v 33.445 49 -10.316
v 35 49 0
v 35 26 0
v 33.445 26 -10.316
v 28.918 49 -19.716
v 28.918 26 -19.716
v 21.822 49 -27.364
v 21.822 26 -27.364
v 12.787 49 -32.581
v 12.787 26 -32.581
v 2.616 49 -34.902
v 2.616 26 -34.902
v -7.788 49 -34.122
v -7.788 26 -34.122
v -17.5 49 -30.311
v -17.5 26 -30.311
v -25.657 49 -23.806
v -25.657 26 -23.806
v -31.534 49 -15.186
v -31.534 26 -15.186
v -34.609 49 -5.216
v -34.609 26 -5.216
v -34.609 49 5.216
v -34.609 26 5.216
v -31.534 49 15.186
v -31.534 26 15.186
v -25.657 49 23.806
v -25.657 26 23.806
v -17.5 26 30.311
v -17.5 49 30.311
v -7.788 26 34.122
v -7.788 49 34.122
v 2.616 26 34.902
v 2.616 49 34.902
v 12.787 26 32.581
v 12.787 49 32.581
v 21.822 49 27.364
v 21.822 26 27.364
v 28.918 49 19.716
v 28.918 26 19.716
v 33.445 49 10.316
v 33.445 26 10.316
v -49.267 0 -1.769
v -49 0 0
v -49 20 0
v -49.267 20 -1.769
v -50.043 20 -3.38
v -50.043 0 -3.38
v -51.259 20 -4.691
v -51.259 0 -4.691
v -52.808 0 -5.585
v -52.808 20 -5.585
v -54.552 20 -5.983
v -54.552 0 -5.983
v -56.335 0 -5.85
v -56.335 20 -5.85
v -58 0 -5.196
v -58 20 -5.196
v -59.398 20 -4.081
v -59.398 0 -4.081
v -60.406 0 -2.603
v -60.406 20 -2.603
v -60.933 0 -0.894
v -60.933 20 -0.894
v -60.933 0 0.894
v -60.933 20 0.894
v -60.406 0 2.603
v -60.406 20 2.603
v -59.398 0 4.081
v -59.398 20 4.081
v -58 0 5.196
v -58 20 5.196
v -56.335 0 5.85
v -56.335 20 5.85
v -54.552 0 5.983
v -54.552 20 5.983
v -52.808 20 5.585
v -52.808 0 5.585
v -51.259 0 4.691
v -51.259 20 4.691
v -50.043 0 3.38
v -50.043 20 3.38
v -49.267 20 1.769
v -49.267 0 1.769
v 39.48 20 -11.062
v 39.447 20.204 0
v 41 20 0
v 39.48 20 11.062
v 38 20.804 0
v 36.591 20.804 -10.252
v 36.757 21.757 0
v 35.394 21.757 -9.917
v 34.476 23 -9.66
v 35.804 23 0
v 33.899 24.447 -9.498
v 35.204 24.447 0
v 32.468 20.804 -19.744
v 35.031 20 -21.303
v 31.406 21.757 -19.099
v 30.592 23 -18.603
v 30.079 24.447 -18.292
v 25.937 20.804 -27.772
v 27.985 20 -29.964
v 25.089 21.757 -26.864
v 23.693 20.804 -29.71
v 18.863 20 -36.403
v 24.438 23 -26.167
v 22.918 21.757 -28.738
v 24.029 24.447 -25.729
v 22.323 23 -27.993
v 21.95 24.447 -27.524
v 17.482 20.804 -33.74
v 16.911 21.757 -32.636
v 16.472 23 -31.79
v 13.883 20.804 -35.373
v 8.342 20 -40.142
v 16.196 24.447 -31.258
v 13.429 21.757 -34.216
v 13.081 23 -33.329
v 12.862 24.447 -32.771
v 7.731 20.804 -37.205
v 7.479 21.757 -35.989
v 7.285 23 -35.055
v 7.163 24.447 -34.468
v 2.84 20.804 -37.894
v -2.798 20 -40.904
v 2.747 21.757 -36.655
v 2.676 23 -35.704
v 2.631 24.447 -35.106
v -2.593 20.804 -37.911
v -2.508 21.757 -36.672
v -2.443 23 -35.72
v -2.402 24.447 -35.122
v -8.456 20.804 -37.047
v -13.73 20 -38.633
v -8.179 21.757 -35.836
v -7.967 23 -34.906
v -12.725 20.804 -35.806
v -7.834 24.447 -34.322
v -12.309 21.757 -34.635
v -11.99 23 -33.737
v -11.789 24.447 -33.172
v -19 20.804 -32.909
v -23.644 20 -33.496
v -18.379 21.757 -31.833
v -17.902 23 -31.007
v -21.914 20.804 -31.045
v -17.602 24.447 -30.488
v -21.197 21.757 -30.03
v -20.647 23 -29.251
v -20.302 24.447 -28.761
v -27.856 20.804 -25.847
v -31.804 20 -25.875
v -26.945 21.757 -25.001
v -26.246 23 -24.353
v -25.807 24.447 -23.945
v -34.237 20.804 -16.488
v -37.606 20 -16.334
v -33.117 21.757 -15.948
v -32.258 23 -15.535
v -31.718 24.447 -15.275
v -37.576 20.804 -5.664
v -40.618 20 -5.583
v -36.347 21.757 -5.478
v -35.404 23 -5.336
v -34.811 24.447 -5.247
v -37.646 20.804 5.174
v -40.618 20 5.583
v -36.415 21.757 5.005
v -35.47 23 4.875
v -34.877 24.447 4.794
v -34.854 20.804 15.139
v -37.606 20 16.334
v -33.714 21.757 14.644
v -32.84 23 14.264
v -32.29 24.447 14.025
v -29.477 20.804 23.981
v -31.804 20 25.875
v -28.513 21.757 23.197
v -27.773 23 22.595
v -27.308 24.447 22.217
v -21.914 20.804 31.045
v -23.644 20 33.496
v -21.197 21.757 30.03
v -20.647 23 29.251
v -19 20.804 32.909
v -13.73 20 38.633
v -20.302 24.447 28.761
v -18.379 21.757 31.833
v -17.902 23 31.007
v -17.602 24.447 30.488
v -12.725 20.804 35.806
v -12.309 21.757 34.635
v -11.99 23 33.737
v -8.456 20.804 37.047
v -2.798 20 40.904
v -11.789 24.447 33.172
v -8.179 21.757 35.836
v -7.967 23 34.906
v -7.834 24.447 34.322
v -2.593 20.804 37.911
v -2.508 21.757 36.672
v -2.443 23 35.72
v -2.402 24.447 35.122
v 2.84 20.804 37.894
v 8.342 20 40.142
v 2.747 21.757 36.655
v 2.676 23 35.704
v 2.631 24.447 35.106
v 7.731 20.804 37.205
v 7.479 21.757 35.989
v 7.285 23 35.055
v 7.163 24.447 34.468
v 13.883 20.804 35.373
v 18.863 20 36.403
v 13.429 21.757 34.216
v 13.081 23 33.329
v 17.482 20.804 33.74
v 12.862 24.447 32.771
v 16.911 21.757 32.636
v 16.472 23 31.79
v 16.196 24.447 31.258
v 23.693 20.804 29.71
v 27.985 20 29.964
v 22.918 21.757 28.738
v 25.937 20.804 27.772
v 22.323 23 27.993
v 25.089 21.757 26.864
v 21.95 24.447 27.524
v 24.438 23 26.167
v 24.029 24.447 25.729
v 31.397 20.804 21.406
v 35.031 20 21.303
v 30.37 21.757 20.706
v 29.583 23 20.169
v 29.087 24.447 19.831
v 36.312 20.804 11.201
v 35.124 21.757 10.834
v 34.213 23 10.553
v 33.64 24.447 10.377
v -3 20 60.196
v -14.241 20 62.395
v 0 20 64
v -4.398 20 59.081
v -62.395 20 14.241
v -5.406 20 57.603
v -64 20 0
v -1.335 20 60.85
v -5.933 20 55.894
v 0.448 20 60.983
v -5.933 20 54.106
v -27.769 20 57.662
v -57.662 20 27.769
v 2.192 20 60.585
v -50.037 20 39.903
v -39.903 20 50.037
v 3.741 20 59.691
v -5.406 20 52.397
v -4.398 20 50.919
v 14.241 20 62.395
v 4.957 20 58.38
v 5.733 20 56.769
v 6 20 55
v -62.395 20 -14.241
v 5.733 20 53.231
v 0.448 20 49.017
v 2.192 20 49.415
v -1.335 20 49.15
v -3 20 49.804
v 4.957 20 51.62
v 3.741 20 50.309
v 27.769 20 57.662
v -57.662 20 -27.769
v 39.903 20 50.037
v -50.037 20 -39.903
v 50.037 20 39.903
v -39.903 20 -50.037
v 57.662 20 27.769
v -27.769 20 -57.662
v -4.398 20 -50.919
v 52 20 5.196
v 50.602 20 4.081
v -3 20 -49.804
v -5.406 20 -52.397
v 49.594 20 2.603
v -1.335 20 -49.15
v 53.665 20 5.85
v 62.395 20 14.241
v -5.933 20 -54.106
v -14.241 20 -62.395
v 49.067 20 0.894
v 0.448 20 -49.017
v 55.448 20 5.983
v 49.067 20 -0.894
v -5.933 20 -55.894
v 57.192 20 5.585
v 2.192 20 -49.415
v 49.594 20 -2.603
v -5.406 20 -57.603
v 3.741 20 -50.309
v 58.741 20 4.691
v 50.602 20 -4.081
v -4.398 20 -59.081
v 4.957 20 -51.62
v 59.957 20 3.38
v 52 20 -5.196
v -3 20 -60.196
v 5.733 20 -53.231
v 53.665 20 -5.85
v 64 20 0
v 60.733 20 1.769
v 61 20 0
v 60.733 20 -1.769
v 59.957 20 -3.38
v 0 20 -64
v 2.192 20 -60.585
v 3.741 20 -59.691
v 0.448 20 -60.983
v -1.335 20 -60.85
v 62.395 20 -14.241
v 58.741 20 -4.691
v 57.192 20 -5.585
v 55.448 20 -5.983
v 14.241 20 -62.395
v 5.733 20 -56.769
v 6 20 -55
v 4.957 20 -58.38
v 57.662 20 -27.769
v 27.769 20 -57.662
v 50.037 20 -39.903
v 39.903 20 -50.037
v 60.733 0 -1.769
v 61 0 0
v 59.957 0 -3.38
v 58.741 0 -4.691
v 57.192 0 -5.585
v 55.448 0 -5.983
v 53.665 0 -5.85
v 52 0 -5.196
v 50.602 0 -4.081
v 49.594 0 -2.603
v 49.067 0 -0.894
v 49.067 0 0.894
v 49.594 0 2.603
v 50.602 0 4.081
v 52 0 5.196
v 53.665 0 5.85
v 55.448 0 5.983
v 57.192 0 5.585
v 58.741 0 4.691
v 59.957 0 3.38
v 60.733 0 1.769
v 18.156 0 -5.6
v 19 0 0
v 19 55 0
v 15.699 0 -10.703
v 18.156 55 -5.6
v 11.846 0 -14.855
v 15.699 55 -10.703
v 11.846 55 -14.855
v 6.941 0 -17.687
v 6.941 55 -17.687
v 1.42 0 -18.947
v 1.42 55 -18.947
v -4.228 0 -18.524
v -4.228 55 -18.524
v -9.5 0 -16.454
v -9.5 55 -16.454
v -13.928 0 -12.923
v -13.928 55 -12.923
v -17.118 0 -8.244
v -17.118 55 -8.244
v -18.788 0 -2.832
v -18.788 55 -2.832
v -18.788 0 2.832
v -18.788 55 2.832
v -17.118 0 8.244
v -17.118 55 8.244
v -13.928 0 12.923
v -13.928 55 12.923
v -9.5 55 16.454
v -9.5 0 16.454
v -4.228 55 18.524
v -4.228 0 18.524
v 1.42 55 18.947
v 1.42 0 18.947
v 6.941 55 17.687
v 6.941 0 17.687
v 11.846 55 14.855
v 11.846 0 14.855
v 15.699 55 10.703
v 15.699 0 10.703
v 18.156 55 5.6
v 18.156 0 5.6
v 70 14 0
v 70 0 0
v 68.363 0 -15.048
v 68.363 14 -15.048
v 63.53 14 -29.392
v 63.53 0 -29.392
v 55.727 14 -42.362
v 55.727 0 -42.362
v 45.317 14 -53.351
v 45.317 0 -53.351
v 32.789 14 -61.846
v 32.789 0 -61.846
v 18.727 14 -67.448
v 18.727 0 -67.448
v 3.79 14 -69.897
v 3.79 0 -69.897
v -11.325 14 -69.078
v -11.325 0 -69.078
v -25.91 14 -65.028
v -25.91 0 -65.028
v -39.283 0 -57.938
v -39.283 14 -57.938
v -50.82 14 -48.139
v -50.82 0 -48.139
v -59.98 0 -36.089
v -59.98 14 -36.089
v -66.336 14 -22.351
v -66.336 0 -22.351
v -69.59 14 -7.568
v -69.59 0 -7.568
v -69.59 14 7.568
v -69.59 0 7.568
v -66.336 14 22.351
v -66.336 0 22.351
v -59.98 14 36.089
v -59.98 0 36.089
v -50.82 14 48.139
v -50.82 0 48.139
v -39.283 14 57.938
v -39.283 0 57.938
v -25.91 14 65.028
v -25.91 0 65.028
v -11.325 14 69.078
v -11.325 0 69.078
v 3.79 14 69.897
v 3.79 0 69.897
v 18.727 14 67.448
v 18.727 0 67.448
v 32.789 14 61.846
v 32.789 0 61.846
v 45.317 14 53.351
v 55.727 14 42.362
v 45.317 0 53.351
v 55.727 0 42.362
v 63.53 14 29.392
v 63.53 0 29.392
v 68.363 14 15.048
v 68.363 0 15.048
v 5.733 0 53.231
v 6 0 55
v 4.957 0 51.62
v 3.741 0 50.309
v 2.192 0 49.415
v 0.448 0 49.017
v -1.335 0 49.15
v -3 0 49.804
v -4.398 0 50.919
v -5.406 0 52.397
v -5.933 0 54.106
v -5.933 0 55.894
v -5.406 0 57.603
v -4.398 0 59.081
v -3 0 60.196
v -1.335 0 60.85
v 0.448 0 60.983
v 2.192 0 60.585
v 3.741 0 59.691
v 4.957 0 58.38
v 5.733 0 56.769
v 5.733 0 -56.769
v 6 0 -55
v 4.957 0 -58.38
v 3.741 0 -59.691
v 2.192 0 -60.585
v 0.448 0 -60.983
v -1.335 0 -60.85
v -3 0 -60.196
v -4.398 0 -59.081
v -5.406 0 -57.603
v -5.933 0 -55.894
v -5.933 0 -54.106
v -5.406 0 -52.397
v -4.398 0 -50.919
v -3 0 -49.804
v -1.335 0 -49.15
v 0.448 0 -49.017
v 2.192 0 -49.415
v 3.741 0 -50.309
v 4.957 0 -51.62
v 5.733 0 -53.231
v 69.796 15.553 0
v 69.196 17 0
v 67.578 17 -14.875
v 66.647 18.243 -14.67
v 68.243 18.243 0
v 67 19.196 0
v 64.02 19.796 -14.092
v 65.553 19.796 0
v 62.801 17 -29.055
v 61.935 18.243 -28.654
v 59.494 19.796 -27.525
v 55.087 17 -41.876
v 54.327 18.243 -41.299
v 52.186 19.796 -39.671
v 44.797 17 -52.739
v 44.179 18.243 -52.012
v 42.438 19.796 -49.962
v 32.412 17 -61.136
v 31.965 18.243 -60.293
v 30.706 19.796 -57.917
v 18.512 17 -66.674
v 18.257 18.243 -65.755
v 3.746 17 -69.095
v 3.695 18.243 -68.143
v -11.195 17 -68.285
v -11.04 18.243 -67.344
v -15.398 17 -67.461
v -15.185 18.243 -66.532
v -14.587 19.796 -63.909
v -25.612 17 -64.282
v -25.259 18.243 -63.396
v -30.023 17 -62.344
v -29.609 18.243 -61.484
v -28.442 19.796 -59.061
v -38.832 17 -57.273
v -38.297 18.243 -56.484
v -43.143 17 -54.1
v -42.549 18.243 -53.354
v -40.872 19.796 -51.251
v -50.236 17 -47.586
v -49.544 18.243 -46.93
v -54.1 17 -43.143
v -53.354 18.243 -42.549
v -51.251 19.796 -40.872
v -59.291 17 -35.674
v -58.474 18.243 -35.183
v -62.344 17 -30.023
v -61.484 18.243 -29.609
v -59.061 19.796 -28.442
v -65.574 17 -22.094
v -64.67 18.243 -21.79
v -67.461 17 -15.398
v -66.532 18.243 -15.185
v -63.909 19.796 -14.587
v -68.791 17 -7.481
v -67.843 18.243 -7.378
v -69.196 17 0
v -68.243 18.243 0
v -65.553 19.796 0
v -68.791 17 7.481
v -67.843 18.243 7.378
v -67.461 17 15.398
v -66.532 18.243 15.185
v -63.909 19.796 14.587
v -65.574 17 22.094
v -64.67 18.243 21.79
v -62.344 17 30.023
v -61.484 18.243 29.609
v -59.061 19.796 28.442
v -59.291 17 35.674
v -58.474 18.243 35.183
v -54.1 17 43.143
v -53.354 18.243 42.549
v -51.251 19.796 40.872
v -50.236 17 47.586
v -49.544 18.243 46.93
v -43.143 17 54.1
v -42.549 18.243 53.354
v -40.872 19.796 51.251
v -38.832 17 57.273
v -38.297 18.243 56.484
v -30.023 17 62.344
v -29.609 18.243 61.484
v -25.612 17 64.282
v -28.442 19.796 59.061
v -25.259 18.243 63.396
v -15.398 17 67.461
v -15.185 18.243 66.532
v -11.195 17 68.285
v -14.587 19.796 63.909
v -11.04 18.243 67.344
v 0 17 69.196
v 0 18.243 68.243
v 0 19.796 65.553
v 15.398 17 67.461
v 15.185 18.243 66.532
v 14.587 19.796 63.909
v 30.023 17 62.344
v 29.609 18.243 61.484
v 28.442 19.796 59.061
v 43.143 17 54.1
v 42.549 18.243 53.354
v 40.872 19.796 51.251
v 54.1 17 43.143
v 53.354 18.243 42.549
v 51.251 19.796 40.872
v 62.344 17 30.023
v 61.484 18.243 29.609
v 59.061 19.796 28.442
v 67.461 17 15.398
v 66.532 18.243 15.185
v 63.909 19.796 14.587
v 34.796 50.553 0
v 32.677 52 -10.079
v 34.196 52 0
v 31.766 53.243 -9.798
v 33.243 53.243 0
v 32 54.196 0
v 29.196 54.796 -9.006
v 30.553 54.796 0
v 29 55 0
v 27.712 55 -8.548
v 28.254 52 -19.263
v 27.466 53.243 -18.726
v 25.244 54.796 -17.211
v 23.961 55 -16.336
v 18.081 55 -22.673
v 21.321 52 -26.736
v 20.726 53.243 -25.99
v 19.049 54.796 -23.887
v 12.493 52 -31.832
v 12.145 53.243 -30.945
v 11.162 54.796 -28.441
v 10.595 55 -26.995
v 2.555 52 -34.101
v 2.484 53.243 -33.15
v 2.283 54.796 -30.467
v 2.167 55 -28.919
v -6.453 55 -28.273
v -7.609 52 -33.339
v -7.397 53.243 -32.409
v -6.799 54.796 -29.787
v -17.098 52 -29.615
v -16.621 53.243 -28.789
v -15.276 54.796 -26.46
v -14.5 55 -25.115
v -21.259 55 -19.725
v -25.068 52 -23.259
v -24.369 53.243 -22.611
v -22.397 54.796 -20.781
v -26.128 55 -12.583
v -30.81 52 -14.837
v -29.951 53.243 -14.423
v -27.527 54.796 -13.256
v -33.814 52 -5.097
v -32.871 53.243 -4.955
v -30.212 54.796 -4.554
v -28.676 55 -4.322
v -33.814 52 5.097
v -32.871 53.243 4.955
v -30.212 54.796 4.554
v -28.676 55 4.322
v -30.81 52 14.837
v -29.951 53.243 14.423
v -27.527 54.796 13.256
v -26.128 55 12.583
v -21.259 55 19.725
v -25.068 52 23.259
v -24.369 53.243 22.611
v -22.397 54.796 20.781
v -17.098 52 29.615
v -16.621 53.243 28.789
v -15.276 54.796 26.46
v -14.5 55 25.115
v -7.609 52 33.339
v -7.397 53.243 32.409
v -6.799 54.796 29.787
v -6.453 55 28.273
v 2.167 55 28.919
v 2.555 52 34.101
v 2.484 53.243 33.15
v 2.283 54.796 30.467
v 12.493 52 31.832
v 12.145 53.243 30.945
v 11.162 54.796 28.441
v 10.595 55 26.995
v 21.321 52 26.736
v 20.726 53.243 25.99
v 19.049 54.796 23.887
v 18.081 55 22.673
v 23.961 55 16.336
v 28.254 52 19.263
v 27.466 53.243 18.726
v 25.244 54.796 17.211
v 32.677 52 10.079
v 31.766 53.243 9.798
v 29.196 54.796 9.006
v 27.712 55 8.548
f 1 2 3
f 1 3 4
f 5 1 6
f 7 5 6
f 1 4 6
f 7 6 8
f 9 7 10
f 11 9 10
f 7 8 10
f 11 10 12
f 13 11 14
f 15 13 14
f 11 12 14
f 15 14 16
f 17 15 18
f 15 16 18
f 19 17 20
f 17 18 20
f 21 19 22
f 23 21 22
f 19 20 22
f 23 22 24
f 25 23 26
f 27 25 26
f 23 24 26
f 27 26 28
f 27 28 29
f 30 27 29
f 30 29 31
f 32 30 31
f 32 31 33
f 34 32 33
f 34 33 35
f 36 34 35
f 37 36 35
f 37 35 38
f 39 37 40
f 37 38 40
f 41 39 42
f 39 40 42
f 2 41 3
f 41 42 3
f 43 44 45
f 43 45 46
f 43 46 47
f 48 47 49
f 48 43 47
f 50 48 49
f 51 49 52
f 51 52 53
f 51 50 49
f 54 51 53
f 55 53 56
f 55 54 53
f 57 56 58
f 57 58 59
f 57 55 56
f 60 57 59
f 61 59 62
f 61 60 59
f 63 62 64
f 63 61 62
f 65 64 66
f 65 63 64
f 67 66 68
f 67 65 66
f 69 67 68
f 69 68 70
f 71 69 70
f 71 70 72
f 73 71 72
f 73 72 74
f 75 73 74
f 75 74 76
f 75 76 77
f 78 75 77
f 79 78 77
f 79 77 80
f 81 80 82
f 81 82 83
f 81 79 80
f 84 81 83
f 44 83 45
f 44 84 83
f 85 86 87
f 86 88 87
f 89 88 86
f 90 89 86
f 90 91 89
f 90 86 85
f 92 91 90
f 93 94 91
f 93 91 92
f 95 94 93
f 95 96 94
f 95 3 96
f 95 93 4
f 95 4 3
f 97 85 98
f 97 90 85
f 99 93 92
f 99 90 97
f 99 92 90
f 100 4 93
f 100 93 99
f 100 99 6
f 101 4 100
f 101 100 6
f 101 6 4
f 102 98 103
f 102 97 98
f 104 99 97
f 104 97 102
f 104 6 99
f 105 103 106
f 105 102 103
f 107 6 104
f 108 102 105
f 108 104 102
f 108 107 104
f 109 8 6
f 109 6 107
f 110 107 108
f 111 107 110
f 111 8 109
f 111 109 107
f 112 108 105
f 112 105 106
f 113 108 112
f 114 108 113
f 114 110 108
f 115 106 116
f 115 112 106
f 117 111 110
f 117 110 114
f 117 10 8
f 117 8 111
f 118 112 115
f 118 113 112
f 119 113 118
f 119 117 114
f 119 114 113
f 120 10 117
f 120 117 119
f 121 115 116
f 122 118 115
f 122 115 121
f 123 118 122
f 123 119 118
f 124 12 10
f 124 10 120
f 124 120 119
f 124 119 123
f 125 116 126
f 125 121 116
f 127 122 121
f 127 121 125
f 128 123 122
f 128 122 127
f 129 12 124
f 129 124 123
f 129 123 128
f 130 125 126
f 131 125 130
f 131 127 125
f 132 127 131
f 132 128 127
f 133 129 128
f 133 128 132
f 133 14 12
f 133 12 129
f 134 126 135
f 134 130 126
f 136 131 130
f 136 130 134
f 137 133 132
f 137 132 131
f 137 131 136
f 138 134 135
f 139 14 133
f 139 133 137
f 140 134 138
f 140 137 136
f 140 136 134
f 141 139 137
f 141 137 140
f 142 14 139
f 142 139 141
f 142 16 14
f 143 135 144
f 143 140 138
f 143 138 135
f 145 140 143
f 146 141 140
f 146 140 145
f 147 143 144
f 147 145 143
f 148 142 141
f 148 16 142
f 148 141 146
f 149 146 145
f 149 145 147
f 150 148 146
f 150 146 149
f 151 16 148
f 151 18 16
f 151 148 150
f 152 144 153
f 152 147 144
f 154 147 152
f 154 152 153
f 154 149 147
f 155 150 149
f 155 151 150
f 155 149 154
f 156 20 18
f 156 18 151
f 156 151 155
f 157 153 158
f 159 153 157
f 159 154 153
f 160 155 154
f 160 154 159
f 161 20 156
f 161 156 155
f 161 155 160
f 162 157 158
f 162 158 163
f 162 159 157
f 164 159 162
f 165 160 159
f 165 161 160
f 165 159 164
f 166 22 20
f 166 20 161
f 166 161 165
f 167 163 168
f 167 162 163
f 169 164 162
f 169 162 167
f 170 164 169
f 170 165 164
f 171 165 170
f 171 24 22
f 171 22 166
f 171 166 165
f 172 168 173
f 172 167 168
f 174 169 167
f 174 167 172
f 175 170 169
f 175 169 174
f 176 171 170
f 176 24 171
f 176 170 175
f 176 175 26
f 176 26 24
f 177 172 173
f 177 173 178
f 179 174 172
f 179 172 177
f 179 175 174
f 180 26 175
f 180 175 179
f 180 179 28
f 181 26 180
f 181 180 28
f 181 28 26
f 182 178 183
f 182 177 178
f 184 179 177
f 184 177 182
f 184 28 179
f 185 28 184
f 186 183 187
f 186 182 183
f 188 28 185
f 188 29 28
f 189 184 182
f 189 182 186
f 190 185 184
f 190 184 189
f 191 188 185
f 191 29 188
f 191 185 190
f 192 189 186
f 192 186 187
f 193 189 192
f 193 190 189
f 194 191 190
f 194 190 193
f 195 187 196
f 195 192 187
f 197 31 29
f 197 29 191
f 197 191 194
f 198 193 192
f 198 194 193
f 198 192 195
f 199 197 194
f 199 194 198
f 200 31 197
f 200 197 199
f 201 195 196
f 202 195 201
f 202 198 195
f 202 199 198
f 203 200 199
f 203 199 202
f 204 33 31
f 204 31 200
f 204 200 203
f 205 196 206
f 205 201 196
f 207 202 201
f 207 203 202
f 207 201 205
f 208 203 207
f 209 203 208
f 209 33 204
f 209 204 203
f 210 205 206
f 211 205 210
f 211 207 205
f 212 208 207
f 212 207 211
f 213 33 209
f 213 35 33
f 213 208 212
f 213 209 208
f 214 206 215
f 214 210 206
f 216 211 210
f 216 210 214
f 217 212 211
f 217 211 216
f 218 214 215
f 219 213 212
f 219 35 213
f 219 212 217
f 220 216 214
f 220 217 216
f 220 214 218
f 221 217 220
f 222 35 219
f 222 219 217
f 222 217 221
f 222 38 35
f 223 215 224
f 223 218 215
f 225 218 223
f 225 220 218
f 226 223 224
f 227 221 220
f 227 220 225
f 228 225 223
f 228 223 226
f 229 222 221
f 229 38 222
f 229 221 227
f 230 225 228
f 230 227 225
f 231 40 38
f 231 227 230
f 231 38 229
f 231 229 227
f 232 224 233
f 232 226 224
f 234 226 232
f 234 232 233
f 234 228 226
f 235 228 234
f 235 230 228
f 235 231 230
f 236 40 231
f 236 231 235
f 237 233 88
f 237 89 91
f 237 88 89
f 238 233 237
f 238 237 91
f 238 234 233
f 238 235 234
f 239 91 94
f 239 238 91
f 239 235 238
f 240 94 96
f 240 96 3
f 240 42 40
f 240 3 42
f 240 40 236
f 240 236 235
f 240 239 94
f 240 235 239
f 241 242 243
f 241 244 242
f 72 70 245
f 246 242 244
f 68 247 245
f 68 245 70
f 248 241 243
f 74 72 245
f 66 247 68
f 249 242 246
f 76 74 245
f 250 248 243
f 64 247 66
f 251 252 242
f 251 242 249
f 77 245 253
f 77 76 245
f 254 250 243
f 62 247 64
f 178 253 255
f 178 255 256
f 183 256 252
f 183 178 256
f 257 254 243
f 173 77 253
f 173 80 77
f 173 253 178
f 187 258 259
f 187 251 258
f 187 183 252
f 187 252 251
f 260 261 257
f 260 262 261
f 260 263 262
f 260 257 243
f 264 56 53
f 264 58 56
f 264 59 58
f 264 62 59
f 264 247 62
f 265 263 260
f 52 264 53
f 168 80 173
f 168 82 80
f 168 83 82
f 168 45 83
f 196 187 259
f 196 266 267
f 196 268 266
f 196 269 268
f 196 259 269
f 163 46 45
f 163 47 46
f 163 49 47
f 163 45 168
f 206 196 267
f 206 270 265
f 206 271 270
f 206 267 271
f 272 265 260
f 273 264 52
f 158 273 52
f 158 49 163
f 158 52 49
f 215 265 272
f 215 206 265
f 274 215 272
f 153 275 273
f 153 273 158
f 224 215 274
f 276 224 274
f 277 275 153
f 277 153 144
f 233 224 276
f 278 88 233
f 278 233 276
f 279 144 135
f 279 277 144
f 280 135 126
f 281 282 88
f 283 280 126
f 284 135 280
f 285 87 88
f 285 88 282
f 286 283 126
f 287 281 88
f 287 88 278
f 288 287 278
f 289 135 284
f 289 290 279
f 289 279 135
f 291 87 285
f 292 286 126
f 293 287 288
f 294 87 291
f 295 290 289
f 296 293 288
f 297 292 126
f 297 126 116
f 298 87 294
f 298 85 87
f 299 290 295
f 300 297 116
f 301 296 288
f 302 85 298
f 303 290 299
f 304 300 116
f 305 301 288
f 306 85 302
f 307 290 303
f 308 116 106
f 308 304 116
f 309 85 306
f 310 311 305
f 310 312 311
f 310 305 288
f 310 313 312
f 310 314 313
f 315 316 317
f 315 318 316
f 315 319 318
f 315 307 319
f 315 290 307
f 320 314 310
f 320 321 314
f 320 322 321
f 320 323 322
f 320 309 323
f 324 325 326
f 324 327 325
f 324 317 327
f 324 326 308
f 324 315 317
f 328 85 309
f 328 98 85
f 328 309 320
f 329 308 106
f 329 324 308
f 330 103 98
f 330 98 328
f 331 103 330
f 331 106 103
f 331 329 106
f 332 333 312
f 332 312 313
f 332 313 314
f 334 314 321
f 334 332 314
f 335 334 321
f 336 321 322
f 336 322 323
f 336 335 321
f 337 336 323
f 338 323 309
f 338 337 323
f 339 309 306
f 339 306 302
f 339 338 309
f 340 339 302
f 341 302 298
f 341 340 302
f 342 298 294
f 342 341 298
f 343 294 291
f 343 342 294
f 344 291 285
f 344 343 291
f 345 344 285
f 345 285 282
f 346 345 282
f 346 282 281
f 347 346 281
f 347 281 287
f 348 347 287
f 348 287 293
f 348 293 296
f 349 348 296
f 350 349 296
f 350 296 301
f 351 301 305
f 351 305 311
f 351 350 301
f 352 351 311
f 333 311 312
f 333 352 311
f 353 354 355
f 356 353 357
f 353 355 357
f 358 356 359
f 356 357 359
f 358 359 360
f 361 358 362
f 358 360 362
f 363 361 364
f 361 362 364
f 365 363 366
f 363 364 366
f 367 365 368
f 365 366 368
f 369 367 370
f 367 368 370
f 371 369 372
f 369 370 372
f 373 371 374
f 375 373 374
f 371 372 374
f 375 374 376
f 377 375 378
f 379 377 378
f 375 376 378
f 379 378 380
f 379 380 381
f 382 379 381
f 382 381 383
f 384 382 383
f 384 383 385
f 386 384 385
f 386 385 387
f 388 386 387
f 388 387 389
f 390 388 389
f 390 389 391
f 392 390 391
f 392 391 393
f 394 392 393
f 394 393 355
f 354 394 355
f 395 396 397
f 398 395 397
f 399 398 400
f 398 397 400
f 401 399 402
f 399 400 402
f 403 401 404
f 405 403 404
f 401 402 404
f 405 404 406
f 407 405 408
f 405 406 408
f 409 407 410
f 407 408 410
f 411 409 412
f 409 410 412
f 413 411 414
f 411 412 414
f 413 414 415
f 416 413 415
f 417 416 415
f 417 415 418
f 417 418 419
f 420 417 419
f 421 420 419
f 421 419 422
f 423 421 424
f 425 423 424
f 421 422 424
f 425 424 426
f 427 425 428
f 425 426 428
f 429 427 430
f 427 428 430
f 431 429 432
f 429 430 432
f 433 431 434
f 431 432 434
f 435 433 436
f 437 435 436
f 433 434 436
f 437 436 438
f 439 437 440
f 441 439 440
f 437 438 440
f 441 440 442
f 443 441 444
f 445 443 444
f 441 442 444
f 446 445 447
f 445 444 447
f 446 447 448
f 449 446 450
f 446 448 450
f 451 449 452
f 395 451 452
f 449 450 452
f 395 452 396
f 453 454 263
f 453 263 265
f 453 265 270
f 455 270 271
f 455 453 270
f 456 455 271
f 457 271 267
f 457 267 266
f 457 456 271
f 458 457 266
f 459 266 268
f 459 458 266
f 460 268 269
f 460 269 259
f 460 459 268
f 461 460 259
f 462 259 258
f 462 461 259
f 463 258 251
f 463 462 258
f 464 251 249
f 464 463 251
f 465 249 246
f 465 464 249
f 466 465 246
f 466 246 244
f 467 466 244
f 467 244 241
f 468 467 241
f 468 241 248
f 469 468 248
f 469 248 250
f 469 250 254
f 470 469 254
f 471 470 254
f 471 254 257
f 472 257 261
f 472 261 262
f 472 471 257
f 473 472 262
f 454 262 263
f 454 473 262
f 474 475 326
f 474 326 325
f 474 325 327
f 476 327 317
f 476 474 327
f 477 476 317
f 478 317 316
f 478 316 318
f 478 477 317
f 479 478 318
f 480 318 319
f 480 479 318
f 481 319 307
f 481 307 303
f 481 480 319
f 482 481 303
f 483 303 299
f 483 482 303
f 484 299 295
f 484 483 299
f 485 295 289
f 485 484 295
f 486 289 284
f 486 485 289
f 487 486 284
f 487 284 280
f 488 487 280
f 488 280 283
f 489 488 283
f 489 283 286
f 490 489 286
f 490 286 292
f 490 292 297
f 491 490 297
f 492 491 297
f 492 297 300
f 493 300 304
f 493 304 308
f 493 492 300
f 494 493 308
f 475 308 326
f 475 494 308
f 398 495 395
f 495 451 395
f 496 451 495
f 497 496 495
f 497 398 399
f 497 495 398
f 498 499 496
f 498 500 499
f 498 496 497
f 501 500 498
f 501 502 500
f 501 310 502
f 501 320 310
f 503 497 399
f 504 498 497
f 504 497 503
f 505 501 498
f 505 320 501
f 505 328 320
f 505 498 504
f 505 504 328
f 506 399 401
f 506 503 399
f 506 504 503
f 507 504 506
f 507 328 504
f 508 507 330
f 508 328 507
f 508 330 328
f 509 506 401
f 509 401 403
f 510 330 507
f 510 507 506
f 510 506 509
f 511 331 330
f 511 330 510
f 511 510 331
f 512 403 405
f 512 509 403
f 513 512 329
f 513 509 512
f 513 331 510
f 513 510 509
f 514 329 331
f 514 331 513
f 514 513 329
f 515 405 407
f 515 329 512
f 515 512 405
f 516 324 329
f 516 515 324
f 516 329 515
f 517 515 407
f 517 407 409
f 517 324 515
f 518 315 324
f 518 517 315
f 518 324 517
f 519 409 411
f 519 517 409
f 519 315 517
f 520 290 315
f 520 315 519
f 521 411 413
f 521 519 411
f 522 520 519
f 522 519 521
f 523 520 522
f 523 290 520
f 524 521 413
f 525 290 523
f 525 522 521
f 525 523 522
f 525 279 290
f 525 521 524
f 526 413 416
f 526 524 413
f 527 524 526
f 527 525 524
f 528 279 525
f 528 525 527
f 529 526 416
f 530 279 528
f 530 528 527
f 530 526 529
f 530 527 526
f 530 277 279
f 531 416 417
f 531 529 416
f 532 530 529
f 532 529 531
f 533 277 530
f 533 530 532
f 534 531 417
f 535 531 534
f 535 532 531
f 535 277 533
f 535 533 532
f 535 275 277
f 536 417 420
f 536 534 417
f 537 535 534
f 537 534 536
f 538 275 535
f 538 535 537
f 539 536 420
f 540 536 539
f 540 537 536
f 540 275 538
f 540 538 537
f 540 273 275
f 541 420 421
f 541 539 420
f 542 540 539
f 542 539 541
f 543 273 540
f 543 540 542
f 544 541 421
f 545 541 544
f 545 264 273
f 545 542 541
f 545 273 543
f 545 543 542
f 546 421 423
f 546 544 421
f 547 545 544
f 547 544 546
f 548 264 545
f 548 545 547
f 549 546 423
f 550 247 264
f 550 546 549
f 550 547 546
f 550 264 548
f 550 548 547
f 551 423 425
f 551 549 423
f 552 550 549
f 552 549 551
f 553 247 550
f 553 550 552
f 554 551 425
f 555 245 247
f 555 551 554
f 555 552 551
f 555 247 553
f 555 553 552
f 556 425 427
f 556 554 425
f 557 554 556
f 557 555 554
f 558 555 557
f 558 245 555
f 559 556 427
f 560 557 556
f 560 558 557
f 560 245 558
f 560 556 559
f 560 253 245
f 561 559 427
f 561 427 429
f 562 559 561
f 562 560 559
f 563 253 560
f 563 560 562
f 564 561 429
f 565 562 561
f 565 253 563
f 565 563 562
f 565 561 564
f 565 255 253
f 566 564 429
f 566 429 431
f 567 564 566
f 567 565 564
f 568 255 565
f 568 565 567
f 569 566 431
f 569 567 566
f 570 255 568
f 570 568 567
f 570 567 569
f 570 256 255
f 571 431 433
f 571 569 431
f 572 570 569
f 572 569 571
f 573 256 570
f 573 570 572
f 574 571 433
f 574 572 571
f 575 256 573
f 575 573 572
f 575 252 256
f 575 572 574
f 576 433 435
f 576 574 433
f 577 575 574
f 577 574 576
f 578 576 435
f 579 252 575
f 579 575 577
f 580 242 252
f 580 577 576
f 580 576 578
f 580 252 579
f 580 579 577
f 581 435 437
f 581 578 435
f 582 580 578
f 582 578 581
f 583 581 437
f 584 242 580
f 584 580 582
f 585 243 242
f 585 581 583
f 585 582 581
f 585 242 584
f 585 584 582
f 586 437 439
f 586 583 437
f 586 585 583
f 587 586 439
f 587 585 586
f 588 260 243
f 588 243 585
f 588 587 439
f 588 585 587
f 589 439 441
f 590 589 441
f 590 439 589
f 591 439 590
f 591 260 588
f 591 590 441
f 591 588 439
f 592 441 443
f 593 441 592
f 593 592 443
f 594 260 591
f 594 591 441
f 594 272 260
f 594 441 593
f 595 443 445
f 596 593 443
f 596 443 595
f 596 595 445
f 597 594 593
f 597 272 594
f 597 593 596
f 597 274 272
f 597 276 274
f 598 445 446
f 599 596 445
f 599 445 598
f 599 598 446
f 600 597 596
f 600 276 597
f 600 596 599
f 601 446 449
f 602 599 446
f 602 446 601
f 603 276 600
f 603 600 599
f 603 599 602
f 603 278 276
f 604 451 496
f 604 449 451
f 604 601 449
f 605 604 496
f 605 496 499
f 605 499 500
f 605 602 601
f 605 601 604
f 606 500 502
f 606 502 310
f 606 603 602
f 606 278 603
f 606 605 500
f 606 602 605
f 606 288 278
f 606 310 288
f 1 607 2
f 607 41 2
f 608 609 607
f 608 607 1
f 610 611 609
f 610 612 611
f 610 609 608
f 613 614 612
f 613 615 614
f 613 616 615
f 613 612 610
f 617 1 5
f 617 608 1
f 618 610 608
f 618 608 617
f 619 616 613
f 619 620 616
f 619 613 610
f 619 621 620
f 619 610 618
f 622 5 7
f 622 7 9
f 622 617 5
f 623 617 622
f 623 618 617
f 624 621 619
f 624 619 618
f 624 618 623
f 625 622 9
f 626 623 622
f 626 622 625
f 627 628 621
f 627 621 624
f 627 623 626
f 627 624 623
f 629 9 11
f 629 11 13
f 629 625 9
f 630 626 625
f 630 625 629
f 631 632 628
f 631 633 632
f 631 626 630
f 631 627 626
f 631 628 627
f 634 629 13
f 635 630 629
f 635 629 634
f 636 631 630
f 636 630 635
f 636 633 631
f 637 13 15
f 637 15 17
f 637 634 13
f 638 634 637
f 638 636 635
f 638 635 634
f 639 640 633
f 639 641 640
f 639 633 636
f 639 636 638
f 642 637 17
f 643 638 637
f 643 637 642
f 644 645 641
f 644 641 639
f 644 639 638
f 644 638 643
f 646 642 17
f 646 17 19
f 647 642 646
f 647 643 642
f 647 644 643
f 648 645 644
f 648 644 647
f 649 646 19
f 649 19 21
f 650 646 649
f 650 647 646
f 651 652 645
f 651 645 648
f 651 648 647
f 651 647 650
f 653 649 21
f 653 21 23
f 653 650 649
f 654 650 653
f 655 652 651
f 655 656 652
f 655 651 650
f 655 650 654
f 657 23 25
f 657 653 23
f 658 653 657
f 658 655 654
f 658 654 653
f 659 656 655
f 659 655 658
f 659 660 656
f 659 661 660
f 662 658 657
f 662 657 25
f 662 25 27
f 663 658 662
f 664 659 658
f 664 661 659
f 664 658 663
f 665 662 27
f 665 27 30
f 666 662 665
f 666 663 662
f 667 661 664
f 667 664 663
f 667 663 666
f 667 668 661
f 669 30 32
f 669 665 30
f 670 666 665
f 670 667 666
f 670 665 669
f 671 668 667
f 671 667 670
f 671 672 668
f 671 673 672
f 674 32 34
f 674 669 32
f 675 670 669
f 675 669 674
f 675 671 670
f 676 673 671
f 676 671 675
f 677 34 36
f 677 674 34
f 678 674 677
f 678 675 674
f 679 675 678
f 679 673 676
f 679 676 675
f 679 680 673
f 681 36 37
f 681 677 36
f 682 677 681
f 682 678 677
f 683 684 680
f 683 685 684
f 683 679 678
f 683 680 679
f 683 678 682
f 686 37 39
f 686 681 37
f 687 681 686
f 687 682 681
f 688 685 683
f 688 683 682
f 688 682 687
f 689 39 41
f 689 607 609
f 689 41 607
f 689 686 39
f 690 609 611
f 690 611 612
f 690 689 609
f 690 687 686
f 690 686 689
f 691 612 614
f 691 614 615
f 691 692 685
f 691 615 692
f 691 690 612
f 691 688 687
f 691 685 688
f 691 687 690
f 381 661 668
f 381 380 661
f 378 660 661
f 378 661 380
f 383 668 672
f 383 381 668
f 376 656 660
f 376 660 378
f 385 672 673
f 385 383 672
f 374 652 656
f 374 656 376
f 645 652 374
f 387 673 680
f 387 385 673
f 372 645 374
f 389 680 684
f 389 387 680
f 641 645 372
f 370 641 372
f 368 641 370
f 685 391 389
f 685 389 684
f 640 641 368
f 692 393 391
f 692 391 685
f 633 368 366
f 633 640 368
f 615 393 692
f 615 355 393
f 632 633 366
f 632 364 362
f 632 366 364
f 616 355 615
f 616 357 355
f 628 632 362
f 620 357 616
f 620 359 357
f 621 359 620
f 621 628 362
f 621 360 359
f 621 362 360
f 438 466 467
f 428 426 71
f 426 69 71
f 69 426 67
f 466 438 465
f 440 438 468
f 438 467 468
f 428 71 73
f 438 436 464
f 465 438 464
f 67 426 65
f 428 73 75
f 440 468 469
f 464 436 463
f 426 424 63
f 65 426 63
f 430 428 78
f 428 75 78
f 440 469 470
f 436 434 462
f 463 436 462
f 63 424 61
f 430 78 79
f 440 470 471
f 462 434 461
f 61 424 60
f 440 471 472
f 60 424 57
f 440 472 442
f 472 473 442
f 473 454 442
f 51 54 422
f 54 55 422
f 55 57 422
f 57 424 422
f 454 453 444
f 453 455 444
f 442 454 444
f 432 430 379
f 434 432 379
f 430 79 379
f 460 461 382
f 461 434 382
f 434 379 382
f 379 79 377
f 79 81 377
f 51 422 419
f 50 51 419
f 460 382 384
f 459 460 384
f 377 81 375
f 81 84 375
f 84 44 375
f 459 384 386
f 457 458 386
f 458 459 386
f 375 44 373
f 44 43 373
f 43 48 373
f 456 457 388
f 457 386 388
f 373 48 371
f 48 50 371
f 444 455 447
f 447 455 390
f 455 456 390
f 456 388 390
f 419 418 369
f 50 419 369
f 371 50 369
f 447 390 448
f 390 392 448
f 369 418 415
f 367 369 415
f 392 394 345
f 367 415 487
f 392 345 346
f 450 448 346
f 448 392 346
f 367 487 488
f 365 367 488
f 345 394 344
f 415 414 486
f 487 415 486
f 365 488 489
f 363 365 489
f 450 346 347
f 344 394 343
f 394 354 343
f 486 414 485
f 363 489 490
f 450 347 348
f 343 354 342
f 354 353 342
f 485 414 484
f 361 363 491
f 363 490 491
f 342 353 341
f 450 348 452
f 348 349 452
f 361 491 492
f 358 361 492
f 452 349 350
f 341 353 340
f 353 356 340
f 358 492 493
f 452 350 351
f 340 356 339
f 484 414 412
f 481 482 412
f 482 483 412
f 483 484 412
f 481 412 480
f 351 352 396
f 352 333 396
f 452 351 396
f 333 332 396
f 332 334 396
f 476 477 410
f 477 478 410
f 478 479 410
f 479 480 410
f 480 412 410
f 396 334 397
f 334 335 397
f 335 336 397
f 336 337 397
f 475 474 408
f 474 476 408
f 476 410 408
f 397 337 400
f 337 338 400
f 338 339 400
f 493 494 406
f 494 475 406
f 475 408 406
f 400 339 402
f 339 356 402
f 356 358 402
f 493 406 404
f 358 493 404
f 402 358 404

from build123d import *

# Parameters (mm, degrees)
SKETCH1_R           = 70
SKETCH1_R_2         = 6
BOSS_EXTRUDE1_DEPTH = 20
SKETCH2_R           = 35
BOSS_EXTRUDE2_DEPTH = 35
SKETCH3_R           = 19
CUT_EXTRUDE1_DEPTH  = 56
FILLET1_R           = 6


with BuildPart() as part:
    # Sketch1 → Boss-Extrude1 (new body)
    with BuildSketch(Plane(origin=(0, 0, 0), x_dir=(1, 0, 0), z_dir=(0, 1, 0))):
        Circle(SKETCH1_R)
        with Locations((0, 55)):
            Circle(SKETCH1_R_2, mode=Mode.SUBTRACT)
        with Locations((55, 0)):
            Circle(SKETCH1_R_2, mode=Mode.SUBTRACT)
        with Locations((0, -55)):
            Circle(SKETCH1_R_2, mode=Mode.SUBTRACT)
        with Locations((-55, 0)):
            Circle(SKETCH1_R_2, mode=Mode.SUBTRACT)
    extrude(amount=BOSS_EXTRUDE1_DEPTH)

    # Sketch2 → Boss-Extrude2 (add)
    with BuildSketch(Plane(origin=(0, 20, 0), x_dir=(1, 0, 0), z_dir=(0, 1, 0))):
        Circle(SKETCH2_R)
    extrude(amount=BOSS_EXTRUDE2_DEPTH)

    # Sketch3 → Cut-Extrude1 (cut, through all)
    with BuildSketch(Plane(origin=(0, 55, 0), x_dir=(1, 0, 0), z_dir=(0, 1, 0))):
        Circle(SKETCH3_R)
    extrude(amount=-CUT_EXTRUDE1_DEPTH, mode=Mode.SUBTRACT)

    # Fillet1
    fillet1_edges = [part.edges().sort_by_distance(p)[0] for p in [
        (-35, 20, 0),
        (-35, 55, 0),
        (-70, 20, 0),
    ]]
    fillet(fillet1_edges, radius=FILLET1_R)


solid = part.part
